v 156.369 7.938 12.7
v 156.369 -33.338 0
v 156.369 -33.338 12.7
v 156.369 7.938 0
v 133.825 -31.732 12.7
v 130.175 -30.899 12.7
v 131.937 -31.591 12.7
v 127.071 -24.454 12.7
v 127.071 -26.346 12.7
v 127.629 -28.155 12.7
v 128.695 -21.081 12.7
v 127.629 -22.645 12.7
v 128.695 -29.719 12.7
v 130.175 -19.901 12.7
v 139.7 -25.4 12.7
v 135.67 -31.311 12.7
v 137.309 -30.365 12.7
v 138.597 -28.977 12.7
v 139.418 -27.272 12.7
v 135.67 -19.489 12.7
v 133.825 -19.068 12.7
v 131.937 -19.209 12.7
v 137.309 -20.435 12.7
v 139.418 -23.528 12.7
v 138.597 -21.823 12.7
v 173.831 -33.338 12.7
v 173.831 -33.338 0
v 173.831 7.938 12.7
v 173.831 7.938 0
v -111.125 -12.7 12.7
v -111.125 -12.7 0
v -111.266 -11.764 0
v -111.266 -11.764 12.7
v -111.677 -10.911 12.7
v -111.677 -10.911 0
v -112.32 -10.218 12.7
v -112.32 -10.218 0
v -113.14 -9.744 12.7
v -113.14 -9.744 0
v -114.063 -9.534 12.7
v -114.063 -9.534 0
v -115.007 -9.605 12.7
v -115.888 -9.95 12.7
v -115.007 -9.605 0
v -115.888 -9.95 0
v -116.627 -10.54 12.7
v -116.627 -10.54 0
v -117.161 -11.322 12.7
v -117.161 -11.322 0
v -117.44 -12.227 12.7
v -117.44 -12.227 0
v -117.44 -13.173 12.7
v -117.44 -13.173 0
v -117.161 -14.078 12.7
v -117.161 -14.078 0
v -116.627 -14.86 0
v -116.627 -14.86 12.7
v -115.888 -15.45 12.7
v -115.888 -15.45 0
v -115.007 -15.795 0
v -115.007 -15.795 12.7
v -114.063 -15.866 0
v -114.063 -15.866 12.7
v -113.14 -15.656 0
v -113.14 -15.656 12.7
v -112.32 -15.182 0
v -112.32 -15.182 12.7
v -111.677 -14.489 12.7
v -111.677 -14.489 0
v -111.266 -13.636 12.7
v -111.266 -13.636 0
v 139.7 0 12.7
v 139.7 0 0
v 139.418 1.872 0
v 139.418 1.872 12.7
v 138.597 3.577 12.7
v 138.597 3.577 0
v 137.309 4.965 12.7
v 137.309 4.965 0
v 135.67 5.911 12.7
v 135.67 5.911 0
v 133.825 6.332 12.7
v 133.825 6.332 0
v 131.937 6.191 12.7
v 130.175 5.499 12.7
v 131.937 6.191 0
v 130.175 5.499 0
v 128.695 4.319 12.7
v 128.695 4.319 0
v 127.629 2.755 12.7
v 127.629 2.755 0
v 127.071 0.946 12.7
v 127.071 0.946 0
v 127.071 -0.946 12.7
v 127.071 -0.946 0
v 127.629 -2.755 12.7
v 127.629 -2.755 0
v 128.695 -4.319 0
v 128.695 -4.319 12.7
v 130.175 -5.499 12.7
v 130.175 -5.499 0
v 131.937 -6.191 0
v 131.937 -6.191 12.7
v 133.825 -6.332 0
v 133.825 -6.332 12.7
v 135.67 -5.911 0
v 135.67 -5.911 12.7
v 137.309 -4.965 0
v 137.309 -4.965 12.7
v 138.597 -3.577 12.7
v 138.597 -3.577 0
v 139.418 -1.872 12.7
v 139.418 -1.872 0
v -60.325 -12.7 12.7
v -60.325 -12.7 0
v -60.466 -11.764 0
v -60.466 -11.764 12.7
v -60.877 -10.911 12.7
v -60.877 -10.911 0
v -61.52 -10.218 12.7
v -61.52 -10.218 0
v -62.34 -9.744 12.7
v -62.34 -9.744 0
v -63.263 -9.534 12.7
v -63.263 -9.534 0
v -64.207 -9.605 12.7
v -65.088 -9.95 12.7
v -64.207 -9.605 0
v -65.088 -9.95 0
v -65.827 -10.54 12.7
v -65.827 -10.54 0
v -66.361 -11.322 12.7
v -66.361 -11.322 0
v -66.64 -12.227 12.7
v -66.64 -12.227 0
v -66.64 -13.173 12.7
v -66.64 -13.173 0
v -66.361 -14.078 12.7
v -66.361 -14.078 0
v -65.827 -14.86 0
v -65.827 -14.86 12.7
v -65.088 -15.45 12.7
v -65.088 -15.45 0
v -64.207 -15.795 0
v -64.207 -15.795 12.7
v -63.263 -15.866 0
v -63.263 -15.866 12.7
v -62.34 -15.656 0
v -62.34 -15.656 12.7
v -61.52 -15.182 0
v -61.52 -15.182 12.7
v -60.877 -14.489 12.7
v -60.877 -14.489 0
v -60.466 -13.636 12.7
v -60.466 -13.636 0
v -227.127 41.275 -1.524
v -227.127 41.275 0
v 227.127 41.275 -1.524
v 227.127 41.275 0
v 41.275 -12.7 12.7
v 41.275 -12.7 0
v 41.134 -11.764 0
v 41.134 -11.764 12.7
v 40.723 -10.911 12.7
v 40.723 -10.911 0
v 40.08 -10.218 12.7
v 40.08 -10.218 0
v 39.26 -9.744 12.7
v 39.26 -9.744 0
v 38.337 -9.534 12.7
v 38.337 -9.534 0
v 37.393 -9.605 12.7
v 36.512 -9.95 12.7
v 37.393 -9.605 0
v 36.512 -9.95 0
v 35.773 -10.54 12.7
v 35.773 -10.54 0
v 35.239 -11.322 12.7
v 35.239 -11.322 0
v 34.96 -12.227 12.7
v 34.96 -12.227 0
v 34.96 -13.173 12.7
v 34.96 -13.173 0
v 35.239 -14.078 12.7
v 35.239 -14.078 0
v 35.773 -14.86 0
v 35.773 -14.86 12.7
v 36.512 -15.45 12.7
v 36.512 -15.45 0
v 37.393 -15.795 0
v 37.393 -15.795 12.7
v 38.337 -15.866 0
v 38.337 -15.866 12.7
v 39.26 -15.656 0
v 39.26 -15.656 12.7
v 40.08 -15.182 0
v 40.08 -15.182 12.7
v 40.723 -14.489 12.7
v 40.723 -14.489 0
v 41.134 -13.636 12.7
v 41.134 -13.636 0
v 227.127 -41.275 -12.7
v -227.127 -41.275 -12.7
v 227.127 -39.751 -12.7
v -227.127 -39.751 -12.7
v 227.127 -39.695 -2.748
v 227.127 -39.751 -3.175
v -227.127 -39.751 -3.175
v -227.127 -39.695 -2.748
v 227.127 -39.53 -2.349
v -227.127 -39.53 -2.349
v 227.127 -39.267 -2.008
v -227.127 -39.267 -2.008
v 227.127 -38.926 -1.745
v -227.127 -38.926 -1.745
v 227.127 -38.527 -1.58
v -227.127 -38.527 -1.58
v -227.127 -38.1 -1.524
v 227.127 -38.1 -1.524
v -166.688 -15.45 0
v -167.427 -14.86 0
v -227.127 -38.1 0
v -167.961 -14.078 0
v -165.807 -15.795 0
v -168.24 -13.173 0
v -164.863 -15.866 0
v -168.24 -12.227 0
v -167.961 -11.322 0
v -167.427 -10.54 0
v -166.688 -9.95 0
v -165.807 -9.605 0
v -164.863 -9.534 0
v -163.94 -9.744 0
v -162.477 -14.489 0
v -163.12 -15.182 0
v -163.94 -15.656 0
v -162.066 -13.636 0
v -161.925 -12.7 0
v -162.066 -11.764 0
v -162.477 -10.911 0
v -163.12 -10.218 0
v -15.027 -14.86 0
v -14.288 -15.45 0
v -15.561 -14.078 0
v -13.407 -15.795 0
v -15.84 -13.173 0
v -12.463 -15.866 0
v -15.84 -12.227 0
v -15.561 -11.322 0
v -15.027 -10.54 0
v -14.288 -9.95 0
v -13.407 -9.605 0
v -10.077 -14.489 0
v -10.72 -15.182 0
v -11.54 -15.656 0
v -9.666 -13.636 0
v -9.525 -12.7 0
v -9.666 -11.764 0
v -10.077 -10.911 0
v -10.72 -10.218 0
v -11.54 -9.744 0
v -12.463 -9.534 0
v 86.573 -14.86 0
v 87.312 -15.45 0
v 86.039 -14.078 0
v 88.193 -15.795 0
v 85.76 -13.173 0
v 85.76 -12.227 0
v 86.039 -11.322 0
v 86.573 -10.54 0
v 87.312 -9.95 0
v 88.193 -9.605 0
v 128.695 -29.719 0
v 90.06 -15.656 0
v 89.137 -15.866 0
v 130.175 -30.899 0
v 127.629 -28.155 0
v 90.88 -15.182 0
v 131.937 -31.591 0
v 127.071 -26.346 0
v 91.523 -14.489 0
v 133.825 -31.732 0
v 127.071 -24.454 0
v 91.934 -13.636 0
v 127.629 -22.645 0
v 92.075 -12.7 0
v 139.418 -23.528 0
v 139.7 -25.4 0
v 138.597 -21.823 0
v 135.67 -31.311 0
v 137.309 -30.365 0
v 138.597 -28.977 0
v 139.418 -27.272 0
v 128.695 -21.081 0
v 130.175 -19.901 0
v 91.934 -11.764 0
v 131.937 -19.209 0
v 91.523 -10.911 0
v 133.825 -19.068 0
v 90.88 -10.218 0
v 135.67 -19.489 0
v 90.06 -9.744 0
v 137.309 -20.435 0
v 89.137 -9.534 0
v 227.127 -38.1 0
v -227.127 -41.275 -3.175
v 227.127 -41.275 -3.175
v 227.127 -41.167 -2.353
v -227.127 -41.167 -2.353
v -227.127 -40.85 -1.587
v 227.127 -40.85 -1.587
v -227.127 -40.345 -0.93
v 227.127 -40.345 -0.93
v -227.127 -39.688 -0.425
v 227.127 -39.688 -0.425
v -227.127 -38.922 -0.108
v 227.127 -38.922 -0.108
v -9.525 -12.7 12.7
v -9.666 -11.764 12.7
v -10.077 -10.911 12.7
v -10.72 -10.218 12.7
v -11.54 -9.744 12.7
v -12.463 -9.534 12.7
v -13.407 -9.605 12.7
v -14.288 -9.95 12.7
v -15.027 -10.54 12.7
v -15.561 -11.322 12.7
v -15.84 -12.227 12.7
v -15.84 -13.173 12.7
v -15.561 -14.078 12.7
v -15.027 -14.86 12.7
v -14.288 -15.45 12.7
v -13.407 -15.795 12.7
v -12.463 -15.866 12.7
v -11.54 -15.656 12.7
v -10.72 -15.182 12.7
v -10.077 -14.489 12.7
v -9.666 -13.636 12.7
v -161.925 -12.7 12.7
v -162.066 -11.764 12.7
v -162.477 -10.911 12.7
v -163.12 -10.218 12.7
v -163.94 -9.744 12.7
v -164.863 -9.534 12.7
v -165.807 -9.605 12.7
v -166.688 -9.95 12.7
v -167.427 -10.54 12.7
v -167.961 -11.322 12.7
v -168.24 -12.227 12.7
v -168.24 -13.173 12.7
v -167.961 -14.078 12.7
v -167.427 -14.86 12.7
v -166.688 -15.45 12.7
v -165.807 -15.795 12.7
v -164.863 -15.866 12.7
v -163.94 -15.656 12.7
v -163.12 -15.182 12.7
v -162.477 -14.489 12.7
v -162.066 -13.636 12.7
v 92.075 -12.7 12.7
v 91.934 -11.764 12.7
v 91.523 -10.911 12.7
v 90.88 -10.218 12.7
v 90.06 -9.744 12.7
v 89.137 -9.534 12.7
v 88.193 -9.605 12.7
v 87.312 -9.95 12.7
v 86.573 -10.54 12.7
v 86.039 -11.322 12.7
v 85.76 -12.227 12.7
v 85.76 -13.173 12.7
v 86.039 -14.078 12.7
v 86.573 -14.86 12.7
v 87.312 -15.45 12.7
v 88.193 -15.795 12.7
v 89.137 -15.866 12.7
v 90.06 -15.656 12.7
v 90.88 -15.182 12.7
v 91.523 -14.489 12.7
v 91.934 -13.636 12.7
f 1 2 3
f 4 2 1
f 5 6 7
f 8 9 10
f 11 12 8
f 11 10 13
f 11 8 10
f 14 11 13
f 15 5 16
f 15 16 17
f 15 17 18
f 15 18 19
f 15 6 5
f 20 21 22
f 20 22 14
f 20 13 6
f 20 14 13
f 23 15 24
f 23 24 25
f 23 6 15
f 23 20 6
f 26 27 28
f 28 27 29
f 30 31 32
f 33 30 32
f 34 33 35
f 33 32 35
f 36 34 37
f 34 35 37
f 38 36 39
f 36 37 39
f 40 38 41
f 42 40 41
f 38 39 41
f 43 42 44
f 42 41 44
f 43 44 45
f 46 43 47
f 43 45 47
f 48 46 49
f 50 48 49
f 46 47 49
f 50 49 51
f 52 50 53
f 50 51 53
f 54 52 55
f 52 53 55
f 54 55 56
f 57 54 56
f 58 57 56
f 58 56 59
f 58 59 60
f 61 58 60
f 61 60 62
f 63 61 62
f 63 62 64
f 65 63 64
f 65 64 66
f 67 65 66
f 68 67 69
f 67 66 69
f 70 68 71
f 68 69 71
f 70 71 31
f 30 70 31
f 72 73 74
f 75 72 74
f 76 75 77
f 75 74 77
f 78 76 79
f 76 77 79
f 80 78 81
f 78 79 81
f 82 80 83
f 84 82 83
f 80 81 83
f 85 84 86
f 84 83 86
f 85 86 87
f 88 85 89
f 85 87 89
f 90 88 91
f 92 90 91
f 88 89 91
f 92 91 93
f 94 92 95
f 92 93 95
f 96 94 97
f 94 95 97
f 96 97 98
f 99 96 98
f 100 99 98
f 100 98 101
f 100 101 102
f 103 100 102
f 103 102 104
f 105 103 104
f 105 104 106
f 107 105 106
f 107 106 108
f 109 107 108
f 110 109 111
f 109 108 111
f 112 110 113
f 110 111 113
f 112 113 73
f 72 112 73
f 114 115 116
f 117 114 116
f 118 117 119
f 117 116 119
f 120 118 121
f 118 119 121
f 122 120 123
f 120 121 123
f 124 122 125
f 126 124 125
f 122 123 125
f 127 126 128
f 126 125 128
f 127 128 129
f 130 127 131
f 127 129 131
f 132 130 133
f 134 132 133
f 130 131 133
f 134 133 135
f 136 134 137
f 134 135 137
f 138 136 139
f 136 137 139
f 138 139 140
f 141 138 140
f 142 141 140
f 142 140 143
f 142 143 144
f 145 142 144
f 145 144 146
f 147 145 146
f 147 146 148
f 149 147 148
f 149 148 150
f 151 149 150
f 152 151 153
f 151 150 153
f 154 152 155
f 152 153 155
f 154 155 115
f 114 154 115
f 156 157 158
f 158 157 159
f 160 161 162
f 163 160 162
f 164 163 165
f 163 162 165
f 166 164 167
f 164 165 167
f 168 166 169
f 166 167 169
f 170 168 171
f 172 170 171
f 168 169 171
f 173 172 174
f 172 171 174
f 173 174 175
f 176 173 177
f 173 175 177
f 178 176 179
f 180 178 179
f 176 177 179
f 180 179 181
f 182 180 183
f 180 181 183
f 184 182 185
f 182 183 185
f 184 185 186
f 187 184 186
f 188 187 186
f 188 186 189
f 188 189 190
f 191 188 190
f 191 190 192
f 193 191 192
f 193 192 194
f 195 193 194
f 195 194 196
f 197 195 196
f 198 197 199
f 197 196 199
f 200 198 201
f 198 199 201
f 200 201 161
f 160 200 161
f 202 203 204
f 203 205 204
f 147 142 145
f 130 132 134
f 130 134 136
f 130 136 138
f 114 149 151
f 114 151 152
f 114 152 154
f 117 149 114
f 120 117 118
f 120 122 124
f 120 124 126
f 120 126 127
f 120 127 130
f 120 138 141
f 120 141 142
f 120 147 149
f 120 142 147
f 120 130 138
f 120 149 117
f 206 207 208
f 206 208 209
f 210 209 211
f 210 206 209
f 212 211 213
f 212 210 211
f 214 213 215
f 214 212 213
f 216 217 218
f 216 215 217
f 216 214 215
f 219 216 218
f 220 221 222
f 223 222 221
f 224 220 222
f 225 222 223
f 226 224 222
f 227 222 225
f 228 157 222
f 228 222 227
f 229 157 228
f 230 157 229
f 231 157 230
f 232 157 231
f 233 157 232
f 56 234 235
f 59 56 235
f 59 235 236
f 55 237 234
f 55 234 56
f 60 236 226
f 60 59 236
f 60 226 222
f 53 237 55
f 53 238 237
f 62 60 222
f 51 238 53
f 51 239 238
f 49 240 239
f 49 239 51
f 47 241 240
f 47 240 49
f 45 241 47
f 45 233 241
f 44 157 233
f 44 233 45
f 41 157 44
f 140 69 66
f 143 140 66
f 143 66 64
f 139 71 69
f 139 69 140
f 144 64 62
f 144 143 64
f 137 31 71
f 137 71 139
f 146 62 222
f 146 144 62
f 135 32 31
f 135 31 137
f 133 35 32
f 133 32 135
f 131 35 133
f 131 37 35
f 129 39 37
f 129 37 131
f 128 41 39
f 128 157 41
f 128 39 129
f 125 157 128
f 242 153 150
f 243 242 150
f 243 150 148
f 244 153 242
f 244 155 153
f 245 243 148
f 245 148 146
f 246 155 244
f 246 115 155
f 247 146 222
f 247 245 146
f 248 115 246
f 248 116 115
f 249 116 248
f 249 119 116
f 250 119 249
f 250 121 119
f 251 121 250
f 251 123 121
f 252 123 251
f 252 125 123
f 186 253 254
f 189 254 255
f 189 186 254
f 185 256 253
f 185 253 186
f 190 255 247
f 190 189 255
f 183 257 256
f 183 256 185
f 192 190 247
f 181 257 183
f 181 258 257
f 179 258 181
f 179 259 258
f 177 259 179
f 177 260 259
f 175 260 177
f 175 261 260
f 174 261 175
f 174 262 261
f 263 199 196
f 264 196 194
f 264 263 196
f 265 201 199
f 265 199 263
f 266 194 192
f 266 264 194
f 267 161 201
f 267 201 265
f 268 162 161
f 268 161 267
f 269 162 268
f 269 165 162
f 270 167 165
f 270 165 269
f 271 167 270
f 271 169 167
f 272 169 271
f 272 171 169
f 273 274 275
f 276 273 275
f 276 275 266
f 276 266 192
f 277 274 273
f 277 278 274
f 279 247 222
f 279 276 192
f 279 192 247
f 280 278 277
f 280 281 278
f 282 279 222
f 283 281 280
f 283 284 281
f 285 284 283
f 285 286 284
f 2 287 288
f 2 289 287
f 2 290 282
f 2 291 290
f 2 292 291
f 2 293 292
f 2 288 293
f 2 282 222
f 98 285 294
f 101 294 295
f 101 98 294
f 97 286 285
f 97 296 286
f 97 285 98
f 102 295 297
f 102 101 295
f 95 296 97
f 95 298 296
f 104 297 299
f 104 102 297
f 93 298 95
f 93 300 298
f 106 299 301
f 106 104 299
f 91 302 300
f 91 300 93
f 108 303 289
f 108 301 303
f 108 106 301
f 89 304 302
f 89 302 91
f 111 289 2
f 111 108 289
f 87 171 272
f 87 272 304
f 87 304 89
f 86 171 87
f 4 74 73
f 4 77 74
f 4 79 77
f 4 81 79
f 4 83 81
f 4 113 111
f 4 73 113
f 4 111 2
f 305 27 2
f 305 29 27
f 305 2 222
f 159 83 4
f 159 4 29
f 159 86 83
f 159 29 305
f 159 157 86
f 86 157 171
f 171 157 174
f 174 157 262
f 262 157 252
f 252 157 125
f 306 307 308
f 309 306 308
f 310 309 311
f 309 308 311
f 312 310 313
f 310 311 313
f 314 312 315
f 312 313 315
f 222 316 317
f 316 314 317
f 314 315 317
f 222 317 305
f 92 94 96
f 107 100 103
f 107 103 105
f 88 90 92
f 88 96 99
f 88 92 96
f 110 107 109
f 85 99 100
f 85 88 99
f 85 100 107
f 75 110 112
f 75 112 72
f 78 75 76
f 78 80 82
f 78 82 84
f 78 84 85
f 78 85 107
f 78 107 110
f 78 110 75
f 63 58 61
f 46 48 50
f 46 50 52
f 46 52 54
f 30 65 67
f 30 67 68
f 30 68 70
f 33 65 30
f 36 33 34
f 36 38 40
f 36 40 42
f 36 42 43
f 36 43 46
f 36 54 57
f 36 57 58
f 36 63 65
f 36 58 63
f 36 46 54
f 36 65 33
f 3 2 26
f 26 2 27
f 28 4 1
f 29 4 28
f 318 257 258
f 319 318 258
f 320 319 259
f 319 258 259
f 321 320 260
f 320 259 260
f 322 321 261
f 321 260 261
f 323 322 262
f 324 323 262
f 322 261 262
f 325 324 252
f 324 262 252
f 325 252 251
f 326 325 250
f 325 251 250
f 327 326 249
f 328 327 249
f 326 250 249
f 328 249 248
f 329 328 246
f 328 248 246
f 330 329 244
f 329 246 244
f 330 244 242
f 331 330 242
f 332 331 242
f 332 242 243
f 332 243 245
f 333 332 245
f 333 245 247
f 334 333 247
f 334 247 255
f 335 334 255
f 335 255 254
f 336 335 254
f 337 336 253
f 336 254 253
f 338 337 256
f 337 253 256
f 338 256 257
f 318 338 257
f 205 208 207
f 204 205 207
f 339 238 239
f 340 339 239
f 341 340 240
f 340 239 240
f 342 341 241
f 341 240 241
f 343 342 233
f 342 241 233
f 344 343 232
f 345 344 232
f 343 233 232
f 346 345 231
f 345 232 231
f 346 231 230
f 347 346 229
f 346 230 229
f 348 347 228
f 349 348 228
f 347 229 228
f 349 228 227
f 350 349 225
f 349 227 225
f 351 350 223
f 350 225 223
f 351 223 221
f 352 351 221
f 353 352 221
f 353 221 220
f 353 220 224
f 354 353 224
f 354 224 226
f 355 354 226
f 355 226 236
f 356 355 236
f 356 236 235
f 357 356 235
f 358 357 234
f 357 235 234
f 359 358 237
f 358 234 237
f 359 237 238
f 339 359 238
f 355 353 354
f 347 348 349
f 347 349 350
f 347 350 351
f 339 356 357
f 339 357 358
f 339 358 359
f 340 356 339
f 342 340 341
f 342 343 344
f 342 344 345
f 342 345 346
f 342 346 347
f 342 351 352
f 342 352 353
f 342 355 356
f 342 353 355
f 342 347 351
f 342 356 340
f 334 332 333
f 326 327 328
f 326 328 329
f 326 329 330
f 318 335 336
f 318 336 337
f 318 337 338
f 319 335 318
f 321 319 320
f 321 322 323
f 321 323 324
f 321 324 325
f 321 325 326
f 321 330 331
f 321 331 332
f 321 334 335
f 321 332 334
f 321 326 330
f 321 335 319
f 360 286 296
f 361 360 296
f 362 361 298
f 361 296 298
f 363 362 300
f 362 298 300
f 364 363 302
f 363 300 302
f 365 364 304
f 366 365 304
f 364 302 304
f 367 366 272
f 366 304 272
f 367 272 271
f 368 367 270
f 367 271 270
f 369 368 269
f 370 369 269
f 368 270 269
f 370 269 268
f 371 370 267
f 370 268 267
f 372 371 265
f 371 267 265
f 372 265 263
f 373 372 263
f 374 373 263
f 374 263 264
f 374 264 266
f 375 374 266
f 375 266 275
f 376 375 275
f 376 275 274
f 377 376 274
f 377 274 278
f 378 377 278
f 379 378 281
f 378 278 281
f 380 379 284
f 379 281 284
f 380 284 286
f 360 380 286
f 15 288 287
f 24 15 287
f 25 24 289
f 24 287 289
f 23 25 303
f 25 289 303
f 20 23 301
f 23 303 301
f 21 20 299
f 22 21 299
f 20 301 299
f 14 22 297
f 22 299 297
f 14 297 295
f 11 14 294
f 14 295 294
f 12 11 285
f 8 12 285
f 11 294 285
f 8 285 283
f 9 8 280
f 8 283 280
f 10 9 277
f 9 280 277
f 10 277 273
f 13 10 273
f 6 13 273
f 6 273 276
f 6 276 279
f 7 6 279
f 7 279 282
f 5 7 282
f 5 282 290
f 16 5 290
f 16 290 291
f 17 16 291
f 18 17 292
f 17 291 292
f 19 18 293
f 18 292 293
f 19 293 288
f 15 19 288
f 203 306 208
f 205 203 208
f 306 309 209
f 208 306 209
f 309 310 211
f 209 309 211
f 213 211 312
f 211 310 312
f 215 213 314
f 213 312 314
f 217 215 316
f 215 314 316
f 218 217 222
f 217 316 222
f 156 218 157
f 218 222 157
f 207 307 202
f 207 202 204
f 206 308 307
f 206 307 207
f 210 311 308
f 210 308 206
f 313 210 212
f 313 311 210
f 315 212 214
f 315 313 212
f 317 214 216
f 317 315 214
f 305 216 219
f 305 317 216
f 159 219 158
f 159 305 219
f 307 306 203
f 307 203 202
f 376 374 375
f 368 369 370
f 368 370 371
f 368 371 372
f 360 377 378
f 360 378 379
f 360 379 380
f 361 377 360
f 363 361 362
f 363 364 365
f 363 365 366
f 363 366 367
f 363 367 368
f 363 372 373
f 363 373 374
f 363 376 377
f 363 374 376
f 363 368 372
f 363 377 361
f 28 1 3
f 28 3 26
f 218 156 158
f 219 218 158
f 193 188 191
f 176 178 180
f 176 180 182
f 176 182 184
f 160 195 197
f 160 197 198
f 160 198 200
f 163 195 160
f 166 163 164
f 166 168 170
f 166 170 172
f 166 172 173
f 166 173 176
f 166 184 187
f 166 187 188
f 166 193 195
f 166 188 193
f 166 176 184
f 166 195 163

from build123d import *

# Parameters (mm, degrees)
F0_W     = 482.6
F0_H     = 82.55
F1_DEPTH = 12.7
F2_R     = 3.175
F3_T     = -1.524
F4_R     = 3.175
F4_R_2   = 6.35
F4_W     = 17.4625
F4_H     = 41.275
F5_DEPTH = 12.7
F6_W     = 14.1732
F6_H     = 82.55
F7_DEPTH = 25.4


with BuildPart() as f1:
    # F0 (on Top) → F1 (new body)
    with BuildSketch(Plane.XY):
        Rectangle(F0_W, F0_H)
    extrude(amount=-F1_DEPTH)

    # F2
    f2_edges = [f1.edges().sort_by_distance(p)[0] for p in [
        (0, -41.275, 0),
    ]]
    fillet(f2_edges, radius=F2_R)

    # F3
    f3_openings = [f1.faces().sort_by_distance(p)[0] for p in [
        (0, 0, -12.7),
        (241.3, 0.08388, -6.361664),
        (0, 41.275, -6.35),
        (-241.3, 0.08388, -6.361664),
    ]]
    offset(amount=F3_T, openings=f3_openings)

    # F4 (on face) → F5 (join)
    with BuildSketch(Plane.XY):
        with Locations((-114.3, -12.7)):
            Circle(F4_R)
        with Locations((-63.5, -12.7)):
            Circle(F4_R)
        with Locations((-12.7, -12.7)):
            Circle(F4_R)
        with Locations((38.1, -12.7)):
            Circle(F4_R)
        with Locations((88.9, -12.7)):
            Circle(F4_R)
        with Locations((-165.1, -12.7)):
            Circle(F4_R)
        with Locations((133.35, 0)):
            Circle(F4_R_2)
        with Locations((133.35, -25.4)):
            Circle(F4_R_2)
        with Locations((165.1, -12.7)):
            Rectangle(F4_W, F4_H)
    extrude(amount=F5_DEPTH)

    # F6 (on face) → F7 (cut)
    with BuildSketch(Plane.XY):
        with Locations((-234.2134, 0)):
            Rectangle(F6_W, F6_H)
        with Locations((234.2134, 0)):
            Rectangle(F6_W, F6_H)
    extrude(amount=-F7_DEPTH, mode=Mode.SUBTRACT)


solid = f1.part
